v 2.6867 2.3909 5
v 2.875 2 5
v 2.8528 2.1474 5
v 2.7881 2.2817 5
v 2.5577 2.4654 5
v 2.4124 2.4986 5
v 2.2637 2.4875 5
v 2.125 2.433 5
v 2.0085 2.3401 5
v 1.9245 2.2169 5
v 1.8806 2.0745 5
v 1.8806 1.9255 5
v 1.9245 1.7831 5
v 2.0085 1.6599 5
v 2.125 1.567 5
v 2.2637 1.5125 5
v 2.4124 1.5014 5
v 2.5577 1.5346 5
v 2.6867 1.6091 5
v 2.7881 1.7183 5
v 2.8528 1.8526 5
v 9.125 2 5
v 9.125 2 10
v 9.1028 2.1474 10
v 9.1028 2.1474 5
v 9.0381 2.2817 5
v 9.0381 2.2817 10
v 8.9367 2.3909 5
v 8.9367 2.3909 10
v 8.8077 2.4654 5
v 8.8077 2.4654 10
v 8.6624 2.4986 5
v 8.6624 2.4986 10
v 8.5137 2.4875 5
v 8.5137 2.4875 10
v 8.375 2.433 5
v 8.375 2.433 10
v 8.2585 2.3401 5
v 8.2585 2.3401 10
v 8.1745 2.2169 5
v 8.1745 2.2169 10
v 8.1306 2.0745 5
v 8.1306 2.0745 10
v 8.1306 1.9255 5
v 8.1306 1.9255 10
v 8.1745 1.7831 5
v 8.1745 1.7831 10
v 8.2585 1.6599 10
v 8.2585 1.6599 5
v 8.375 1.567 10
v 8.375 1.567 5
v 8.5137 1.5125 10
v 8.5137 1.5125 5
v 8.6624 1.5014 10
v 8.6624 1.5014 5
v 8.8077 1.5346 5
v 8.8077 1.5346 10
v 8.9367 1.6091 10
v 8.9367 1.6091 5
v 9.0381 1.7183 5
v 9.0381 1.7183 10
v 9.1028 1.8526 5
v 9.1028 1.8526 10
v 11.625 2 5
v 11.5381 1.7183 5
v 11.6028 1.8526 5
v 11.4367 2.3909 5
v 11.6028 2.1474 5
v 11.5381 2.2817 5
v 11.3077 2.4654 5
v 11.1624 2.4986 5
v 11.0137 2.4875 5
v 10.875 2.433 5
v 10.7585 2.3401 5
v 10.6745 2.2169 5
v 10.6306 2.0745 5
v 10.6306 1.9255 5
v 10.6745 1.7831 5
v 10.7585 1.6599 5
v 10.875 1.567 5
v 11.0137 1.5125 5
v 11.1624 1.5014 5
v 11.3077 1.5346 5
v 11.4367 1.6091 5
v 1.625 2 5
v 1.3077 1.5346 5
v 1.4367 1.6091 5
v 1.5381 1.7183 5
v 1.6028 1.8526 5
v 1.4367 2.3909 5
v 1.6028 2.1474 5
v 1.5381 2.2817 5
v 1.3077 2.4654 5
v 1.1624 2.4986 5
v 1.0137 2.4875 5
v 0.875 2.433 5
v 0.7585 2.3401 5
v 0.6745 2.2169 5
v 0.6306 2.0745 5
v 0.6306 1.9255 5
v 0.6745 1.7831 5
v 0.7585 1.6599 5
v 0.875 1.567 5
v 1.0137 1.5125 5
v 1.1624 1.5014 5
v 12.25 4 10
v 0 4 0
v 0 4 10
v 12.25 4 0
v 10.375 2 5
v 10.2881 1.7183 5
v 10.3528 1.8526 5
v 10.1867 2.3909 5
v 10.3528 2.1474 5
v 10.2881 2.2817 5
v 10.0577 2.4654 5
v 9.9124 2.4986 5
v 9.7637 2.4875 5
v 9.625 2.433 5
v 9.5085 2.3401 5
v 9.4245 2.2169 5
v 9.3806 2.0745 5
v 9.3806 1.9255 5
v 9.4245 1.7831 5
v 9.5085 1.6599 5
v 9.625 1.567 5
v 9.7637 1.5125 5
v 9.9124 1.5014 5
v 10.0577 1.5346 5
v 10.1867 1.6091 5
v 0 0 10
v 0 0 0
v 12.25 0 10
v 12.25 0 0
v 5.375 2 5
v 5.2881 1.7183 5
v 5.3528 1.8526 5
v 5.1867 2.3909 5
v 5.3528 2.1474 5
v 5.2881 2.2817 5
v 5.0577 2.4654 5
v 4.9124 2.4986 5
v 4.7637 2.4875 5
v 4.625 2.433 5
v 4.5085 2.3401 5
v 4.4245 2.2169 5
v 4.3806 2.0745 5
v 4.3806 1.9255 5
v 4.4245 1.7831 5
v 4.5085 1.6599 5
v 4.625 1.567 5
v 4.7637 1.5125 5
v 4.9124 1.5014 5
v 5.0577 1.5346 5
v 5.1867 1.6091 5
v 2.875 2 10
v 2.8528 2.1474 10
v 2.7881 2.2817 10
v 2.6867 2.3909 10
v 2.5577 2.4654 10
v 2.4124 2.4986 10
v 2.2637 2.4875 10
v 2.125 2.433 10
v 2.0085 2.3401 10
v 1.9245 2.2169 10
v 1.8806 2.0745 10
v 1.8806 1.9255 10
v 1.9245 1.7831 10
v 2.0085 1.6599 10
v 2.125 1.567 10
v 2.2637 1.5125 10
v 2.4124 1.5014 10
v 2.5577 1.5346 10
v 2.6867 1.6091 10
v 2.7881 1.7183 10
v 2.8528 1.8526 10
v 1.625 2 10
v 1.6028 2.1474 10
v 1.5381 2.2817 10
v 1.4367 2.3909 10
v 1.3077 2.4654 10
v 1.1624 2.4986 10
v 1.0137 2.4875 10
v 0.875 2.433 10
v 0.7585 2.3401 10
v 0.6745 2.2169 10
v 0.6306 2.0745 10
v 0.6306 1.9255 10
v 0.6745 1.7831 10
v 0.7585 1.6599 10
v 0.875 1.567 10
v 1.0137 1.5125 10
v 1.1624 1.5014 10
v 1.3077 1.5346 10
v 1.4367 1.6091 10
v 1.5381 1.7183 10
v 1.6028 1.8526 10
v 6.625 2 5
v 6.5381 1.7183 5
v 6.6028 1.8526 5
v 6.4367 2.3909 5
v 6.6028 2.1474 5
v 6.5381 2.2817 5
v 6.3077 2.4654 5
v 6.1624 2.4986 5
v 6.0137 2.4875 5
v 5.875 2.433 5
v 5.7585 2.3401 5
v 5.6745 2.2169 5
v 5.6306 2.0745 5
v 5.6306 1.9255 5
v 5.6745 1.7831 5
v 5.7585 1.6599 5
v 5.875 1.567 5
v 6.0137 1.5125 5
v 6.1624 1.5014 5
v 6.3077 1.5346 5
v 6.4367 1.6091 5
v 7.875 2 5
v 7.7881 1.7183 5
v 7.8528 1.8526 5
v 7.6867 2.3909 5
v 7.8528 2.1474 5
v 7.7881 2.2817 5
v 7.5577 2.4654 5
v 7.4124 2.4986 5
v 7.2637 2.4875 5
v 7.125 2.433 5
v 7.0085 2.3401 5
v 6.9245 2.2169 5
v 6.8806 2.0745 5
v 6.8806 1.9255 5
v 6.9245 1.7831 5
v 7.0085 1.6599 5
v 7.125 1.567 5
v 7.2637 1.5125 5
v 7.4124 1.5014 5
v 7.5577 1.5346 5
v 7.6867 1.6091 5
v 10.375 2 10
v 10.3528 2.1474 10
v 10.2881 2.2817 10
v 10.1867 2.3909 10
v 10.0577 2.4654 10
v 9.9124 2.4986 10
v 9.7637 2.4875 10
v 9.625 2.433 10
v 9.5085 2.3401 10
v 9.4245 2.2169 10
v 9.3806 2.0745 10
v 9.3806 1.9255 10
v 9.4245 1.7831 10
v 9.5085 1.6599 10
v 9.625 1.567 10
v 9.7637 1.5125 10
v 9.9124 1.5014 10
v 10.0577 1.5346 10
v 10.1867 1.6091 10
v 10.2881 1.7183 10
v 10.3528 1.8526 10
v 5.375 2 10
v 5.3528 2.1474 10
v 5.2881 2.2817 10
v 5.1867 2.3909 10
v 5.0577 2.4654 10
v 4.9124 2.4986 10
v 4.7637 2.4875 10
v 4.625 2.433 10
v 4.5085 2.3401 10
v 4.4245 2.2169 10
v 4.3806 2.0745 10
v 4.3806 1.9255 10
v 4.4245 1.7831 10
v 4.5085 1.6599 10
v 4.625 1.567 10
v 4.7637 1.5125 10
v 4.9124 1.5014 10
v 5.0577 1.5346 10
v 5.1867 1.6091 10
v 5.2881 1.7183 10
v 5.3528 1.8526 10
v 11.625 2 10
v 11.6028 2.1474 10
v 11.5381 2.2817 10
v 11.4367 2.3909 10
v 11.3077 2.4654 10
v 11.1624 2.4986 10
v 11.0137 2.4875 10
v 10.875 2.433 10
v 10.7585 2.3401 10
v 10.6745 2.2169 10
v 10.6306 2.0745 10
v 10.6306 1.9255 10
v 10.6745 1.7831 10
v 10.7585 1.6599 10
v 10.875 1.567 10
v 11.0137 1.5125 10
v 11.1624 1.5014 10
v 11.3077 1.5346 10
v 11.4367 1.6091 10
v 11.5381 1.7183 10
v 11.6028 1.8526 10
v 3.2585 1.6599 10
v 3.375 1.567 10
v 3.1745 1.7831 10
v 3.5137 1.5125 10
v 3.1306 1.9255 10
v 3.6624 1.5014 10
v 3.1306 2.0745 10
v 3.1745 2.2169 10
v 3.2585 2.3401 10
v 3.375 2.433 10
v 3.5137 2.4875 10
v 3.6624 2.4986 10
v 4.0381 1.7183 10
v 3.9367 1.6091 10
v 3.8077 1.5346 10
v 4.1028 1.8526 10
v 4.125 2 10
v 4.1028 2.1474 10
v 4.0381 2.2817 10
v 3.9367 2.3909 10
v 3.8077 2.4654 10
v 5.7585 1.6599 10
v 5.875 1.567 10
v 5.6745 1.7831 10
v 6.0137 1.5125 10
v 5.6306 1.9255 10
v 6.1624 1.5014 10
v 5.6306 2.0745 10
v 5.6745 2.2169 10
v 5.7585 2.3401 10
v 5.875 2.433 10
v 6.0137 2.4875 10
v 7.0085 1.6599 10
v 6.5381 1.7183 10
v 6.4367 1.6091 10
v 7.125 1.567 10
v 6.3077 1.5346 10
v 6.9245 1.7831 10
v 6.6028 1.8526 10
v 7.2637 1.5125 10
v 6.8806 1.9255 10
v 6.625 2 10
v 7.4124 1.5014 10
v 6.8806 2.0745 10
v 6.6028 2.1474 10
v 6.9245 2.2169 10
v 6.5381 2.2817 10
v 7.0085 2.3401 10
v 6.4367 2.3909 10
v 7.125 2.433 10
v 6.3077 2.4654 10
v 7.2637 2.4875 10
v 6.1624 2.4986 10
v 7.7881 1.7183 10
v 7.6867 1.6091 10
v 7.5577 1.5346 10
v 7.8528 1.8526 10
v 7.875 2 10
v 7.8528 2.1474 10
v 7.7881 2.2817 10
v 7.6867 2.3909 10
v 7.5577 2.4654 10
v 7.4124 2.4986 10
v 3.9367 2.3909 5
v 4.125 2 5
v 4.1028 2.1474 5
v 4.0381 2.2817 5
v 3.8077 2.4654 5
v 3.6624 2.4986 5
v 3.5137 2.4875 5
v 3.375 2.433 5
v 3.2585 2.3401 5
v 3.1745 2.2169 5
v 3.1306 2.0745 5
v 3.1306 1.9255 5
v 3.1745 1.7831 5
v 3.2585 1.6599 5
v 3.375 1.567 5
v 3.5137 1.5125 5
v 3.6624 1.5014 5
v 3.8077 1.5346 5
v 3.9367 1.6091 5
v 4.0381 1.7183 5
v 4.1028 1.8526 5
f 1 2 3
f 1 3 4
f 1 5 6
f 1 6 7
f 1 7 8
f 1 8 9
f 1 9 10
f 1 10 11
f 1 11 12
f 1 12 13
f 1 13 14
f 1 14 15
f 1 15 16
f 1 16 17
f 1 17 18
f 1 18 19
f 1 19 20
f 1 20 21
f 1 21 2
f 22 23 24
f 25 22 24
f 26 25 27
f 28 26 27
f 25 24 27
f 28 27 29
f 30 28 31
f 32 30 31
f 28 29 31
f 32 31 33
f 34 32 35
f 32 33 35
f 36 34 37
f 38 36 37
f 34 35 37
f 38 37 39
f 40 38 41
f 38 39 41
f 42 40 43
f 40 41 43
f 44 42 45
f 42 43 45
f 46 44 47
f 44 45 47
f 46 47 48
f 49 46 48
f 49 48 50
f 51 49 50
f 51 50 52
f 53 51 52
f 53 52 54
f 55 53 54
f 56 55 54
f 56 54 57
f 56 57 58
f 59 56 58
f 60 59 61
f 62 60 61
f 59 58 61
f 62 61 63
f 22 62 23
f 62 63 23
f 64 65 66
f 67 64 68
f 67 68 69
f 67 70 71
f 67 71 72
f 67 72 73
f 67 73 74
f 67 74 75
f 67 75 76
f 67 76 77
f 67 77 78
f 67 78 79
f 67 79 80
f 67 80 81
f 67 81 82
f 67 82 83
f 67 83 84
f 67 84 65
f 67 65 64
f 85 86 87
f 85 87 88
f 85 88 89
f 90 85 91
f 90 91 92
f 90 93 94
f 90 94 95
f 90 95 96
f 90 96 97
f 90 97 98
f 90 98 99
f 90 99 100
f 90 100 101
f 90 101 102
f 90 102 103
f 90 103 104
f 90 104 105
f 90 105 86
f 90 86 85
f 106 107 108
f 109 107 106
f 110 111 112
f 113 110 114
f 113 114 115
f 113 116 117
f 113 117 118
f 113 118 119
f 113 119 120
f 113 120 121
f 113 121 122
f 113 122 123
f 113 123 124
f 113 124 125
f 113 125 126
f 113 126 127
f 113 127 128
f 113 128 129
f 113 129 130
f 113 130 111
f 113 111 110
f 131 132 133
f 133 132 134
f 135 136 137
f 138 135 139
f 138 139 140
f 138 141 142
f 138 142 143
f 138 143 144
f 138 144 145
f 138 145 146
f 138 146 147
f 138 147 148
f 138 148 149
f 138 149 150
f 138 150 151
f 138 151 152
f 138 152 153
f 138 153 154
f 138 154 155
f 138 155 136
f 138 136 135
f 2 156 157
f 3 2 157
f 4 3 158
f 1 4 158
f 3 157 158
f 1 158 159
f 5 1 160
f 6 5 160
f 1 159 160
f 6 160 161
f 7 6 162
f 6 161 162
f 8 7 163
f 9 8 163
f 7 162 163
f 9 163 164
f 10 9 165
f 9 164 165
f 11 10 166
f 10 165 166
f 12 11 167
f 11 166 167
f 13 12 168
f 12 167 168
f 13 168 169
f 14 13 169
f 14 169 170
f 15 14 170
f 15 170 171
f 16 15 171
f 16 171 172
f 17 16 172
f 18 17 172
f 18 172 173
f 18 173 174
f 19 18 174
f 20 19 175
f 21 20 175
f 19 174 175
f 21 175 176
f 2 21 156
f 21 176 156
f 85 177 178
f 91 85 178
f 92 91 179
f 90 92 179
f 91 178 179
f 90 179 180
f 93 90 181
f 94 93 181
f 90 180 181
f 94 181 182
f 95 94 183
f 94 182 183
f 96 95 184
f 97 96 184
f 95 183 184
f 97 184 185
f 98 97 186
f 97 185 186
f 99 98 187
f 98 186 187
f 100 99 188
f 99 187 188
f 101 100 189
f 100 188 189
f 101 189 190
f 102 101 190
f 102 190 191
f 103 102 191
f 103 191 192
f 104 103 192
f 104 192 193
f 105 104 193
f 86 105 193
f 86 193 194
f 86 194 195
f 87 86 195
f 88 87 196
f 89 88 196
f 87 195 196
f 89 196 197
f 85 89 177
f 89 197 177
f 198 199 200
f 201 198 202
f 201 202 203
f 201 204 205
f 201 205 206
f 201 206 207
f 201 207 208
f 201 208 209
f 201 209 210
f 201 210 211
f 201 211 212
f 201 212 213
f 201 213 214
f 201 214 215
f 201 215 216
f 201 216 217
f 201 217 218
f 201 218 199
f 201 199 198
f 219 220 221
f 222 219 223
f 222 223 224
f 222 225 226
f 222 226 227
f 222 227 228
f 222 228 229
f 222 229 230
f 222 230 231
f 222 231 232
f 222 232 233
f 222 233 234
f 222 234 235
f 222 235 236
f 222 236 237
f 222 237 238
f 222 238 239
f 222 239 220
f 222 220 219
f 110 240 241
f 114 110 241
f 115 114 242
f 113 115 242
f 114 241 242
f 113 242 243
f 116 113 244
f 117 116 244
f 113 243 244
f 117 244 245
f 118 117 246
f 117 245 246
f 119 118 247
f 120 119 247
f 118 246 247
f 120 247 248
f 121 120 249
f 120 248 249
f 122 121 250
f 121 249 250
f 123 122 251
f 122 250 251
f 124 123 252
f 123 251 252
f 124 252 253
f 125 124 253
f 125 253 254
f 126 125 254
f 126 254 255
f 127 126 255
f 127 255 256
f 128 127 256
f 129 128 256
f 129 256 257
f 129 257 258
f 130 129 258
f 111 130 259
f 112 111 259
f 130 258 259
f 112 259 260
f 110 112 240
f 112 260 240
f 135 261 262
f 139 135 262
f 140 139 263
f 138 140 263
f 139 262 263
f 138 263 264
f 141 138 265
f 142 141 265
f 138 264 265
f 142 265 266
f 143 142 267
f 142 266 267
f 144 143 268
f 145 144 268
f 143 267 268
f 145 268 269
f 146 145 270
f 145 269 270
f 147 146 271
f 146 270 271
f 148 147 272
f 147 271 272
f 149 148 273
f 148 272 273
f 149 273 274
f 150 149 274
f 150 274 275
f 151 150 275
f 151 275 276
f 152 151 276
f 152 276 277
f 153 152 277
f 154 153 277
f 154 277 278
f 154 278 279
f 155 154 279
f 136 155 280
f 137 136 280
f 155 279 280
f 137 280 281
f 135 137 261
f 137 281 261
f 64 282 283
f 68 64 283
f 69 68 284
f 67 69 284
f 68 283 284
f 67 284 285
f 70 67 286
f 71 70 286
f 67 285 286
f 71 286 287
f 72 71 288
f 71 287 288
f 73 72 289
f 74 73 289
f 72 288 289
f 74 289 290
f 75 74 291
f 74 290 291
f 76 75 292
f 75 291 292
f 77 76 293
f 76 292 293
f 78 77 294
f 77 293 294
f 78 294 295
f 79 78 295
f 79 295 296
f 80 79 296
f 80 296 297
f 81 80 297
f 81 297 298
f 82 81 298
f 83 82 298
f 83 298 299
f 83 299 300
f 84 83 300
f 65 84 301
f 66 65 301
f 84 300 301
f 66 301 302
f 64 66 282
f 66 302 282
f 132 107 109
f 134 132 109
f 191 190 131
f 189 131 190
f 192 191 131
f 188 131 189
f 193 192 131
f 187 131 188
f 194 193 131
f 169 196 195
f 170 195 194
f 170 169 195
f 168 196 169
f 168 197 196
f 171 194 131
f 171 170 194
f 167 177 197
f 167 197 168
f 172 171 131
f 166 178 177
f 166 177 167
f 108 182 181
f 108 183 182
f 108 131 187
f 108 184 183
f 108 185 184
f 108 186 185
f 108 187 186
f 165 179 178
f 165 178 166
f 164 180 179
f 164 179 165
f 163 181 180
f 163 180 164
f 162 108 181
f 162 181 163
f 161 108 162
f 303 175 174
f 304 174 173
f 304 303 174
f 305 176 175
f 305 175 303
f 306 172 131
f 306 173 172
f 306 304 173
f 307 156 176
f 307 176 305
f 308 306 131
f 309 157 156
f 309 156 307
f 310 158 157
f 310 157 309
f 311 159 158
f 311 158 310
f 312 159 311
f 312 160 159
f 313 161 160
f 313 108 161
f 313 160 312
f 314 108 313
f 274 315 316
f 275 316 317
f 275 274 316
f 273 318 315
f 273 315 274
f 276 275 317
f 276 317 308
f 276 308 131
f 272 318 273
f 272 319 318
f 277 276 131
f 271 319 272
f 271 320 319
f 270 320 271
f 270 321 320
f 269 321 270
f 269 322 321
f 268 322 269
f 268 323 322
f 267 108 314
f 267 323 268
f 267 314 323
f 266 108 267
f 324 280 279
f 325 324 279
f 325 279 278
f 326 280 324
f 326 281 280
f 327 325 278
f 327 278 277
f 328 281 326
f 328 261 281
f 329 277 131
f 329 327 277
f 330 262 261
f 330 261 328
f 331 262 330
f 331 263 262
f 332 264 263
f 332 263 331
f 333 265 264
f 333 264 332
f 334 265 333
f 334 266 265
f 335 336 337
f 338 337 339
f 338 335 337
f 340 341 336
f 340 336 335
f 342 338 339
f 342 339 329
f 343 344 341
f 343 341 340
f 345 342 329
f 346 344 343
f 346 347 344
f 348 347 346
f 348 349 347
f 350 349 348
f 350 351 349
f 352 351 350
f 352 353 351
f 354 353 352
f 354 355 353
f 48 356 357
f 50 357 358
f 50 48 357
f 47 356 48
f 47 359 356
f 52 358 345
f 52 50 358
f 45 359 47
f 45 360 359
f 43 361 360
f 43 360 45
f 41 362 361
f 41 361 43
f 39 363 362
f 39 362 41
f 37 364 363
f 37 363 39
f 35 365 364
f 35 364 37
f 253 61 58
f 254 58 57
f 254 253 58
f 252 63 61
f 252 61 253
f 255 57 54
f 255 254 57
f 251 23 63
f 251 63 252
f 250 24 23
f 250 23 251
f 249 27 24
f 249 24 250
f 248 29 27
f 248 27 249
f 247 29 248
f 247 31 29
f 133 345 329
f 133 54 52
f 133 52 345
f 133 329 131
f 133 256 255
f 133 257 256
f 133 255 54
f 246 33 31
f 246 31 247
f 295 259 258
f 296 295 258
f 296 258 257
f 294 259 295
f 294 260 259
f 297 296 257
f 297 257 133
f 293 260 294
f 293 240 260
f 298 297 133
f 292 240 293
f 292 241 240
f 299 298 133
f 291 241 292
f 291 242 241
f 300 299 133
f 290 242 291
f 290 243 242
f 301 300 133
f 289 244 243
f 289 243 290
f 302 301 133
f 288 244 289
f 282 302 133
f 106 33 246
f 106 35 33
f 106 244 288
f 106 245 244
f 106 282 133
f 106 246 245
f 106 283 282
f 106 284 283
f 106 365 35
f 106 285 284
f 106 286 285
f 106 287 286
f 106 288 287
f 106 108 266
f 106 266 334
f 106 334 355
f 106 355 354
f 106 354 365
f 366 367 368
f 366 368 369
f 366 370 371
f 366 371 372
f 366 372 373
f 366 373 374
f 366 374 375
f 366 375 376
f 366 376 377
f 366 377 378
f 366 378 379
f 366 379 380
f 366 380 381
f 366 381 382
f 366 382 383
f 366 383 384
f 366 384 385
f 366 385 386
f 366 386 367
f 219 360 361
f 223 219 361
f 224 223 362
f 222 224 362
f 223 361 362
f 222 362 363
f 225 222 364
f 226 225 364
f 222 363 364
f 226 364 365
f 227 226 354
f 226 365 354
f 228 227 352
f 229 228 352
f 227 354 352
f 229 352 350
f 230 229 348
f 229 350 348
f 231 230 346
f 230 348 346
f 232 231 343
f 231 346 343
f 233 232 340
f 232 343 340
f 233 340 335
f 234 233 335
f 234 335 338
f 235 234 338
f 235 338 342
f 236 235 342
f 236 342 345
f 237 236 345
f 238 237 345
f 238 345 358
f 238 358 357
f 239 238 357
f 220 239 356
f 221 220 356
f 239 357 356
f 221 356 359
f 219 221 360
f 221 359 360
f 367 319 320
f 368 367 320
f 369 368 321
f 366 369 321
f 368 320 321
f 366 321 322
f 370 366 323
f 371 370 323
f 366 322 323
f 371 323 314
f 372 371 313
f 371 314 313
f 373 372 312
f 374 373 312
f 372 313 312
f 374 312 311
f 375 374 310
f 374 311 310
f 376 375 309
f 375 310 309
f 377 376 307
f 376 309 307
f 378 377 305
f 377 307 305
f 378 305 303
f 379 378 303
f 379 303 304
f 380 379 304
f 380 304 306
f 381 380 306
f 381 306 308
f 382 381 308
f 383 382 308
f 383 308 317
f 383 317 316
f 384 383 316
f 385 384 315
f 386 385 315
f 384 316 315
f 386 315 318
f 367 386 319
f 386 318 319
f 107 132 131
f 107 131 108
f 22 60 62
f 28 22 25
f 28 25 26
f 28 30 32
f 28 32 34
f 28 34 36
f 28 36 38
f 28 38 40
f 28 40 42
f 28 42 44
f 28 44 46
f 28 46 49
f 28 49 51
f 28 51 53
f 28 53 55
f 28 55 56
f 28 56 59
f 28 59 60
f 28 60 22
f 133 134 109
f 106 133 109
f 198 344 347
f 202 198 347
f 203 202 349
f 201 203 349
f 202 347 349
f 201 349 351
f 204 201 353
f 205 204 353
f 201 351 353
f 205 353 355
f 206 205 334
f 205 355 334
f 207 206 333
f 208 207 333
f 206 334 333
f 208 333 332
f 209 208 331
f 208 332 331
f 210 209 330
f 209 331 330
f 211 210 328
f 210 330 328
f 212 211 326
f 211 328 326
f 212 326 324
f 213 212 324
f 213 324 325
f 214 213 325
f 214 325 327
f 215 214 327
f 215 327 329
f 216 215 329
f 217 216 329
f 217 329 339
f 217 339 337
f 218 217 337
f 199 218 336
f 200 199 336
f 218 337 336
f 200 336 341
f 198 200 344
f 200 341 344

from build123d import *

# Parameters (mm, degrees)
SKETCH2_W           = 12.25
SKETCH2_H           = 4
BOSS_EXTRUDE1_DEPTH = 10
SKETCH3_R           = 0.5
CUT_EXTRUDE1_DEPTH  = 5


with BuildPart() as part:
    # Sketch2 → Boss-Extrude1 (new body)
    with BuildSketch(Plane.XY):
        with Locations((6.125, 2)):
            Rectangle(SKETCH2_W, SKETCH2_H)
    extrude(amount=BOSS_EXTRUDE1_DEPTH)

    # Sketch3 → Cut-Extrude1 (cut)
    with BuildSketch(Plane.XY.offset(10)):
        with Locations((1.125, 2)):
            Circle(SKETCH3_R)
        with Locations((2.375, 2)):
            Circle(SKETCH3_R)
        with Locations((3.625, 2)):
            Circle(SKETCH3_R)
        with Locations((4.875, 2)):
            Circle(SKETCH3_R)
        with Locations((6.125, 2)):
            Circle(SKETCH3_R)
        with Locations((7.375, 2)):
            Circle(SKETCH3_R)
        with Locations((8.625, 2)):
            Circle(SKETCH3_R)
        with Locations((9.875, 2)):
            Circle(SKETCH3_R)
        with Locations((11.125, 2)):
            Circle(SKETCH3_R)
    extrude(amount=-CUT_EXTRUDE1_DEPTH, mode=Mode.SUBTRACT)


solid = part.part
